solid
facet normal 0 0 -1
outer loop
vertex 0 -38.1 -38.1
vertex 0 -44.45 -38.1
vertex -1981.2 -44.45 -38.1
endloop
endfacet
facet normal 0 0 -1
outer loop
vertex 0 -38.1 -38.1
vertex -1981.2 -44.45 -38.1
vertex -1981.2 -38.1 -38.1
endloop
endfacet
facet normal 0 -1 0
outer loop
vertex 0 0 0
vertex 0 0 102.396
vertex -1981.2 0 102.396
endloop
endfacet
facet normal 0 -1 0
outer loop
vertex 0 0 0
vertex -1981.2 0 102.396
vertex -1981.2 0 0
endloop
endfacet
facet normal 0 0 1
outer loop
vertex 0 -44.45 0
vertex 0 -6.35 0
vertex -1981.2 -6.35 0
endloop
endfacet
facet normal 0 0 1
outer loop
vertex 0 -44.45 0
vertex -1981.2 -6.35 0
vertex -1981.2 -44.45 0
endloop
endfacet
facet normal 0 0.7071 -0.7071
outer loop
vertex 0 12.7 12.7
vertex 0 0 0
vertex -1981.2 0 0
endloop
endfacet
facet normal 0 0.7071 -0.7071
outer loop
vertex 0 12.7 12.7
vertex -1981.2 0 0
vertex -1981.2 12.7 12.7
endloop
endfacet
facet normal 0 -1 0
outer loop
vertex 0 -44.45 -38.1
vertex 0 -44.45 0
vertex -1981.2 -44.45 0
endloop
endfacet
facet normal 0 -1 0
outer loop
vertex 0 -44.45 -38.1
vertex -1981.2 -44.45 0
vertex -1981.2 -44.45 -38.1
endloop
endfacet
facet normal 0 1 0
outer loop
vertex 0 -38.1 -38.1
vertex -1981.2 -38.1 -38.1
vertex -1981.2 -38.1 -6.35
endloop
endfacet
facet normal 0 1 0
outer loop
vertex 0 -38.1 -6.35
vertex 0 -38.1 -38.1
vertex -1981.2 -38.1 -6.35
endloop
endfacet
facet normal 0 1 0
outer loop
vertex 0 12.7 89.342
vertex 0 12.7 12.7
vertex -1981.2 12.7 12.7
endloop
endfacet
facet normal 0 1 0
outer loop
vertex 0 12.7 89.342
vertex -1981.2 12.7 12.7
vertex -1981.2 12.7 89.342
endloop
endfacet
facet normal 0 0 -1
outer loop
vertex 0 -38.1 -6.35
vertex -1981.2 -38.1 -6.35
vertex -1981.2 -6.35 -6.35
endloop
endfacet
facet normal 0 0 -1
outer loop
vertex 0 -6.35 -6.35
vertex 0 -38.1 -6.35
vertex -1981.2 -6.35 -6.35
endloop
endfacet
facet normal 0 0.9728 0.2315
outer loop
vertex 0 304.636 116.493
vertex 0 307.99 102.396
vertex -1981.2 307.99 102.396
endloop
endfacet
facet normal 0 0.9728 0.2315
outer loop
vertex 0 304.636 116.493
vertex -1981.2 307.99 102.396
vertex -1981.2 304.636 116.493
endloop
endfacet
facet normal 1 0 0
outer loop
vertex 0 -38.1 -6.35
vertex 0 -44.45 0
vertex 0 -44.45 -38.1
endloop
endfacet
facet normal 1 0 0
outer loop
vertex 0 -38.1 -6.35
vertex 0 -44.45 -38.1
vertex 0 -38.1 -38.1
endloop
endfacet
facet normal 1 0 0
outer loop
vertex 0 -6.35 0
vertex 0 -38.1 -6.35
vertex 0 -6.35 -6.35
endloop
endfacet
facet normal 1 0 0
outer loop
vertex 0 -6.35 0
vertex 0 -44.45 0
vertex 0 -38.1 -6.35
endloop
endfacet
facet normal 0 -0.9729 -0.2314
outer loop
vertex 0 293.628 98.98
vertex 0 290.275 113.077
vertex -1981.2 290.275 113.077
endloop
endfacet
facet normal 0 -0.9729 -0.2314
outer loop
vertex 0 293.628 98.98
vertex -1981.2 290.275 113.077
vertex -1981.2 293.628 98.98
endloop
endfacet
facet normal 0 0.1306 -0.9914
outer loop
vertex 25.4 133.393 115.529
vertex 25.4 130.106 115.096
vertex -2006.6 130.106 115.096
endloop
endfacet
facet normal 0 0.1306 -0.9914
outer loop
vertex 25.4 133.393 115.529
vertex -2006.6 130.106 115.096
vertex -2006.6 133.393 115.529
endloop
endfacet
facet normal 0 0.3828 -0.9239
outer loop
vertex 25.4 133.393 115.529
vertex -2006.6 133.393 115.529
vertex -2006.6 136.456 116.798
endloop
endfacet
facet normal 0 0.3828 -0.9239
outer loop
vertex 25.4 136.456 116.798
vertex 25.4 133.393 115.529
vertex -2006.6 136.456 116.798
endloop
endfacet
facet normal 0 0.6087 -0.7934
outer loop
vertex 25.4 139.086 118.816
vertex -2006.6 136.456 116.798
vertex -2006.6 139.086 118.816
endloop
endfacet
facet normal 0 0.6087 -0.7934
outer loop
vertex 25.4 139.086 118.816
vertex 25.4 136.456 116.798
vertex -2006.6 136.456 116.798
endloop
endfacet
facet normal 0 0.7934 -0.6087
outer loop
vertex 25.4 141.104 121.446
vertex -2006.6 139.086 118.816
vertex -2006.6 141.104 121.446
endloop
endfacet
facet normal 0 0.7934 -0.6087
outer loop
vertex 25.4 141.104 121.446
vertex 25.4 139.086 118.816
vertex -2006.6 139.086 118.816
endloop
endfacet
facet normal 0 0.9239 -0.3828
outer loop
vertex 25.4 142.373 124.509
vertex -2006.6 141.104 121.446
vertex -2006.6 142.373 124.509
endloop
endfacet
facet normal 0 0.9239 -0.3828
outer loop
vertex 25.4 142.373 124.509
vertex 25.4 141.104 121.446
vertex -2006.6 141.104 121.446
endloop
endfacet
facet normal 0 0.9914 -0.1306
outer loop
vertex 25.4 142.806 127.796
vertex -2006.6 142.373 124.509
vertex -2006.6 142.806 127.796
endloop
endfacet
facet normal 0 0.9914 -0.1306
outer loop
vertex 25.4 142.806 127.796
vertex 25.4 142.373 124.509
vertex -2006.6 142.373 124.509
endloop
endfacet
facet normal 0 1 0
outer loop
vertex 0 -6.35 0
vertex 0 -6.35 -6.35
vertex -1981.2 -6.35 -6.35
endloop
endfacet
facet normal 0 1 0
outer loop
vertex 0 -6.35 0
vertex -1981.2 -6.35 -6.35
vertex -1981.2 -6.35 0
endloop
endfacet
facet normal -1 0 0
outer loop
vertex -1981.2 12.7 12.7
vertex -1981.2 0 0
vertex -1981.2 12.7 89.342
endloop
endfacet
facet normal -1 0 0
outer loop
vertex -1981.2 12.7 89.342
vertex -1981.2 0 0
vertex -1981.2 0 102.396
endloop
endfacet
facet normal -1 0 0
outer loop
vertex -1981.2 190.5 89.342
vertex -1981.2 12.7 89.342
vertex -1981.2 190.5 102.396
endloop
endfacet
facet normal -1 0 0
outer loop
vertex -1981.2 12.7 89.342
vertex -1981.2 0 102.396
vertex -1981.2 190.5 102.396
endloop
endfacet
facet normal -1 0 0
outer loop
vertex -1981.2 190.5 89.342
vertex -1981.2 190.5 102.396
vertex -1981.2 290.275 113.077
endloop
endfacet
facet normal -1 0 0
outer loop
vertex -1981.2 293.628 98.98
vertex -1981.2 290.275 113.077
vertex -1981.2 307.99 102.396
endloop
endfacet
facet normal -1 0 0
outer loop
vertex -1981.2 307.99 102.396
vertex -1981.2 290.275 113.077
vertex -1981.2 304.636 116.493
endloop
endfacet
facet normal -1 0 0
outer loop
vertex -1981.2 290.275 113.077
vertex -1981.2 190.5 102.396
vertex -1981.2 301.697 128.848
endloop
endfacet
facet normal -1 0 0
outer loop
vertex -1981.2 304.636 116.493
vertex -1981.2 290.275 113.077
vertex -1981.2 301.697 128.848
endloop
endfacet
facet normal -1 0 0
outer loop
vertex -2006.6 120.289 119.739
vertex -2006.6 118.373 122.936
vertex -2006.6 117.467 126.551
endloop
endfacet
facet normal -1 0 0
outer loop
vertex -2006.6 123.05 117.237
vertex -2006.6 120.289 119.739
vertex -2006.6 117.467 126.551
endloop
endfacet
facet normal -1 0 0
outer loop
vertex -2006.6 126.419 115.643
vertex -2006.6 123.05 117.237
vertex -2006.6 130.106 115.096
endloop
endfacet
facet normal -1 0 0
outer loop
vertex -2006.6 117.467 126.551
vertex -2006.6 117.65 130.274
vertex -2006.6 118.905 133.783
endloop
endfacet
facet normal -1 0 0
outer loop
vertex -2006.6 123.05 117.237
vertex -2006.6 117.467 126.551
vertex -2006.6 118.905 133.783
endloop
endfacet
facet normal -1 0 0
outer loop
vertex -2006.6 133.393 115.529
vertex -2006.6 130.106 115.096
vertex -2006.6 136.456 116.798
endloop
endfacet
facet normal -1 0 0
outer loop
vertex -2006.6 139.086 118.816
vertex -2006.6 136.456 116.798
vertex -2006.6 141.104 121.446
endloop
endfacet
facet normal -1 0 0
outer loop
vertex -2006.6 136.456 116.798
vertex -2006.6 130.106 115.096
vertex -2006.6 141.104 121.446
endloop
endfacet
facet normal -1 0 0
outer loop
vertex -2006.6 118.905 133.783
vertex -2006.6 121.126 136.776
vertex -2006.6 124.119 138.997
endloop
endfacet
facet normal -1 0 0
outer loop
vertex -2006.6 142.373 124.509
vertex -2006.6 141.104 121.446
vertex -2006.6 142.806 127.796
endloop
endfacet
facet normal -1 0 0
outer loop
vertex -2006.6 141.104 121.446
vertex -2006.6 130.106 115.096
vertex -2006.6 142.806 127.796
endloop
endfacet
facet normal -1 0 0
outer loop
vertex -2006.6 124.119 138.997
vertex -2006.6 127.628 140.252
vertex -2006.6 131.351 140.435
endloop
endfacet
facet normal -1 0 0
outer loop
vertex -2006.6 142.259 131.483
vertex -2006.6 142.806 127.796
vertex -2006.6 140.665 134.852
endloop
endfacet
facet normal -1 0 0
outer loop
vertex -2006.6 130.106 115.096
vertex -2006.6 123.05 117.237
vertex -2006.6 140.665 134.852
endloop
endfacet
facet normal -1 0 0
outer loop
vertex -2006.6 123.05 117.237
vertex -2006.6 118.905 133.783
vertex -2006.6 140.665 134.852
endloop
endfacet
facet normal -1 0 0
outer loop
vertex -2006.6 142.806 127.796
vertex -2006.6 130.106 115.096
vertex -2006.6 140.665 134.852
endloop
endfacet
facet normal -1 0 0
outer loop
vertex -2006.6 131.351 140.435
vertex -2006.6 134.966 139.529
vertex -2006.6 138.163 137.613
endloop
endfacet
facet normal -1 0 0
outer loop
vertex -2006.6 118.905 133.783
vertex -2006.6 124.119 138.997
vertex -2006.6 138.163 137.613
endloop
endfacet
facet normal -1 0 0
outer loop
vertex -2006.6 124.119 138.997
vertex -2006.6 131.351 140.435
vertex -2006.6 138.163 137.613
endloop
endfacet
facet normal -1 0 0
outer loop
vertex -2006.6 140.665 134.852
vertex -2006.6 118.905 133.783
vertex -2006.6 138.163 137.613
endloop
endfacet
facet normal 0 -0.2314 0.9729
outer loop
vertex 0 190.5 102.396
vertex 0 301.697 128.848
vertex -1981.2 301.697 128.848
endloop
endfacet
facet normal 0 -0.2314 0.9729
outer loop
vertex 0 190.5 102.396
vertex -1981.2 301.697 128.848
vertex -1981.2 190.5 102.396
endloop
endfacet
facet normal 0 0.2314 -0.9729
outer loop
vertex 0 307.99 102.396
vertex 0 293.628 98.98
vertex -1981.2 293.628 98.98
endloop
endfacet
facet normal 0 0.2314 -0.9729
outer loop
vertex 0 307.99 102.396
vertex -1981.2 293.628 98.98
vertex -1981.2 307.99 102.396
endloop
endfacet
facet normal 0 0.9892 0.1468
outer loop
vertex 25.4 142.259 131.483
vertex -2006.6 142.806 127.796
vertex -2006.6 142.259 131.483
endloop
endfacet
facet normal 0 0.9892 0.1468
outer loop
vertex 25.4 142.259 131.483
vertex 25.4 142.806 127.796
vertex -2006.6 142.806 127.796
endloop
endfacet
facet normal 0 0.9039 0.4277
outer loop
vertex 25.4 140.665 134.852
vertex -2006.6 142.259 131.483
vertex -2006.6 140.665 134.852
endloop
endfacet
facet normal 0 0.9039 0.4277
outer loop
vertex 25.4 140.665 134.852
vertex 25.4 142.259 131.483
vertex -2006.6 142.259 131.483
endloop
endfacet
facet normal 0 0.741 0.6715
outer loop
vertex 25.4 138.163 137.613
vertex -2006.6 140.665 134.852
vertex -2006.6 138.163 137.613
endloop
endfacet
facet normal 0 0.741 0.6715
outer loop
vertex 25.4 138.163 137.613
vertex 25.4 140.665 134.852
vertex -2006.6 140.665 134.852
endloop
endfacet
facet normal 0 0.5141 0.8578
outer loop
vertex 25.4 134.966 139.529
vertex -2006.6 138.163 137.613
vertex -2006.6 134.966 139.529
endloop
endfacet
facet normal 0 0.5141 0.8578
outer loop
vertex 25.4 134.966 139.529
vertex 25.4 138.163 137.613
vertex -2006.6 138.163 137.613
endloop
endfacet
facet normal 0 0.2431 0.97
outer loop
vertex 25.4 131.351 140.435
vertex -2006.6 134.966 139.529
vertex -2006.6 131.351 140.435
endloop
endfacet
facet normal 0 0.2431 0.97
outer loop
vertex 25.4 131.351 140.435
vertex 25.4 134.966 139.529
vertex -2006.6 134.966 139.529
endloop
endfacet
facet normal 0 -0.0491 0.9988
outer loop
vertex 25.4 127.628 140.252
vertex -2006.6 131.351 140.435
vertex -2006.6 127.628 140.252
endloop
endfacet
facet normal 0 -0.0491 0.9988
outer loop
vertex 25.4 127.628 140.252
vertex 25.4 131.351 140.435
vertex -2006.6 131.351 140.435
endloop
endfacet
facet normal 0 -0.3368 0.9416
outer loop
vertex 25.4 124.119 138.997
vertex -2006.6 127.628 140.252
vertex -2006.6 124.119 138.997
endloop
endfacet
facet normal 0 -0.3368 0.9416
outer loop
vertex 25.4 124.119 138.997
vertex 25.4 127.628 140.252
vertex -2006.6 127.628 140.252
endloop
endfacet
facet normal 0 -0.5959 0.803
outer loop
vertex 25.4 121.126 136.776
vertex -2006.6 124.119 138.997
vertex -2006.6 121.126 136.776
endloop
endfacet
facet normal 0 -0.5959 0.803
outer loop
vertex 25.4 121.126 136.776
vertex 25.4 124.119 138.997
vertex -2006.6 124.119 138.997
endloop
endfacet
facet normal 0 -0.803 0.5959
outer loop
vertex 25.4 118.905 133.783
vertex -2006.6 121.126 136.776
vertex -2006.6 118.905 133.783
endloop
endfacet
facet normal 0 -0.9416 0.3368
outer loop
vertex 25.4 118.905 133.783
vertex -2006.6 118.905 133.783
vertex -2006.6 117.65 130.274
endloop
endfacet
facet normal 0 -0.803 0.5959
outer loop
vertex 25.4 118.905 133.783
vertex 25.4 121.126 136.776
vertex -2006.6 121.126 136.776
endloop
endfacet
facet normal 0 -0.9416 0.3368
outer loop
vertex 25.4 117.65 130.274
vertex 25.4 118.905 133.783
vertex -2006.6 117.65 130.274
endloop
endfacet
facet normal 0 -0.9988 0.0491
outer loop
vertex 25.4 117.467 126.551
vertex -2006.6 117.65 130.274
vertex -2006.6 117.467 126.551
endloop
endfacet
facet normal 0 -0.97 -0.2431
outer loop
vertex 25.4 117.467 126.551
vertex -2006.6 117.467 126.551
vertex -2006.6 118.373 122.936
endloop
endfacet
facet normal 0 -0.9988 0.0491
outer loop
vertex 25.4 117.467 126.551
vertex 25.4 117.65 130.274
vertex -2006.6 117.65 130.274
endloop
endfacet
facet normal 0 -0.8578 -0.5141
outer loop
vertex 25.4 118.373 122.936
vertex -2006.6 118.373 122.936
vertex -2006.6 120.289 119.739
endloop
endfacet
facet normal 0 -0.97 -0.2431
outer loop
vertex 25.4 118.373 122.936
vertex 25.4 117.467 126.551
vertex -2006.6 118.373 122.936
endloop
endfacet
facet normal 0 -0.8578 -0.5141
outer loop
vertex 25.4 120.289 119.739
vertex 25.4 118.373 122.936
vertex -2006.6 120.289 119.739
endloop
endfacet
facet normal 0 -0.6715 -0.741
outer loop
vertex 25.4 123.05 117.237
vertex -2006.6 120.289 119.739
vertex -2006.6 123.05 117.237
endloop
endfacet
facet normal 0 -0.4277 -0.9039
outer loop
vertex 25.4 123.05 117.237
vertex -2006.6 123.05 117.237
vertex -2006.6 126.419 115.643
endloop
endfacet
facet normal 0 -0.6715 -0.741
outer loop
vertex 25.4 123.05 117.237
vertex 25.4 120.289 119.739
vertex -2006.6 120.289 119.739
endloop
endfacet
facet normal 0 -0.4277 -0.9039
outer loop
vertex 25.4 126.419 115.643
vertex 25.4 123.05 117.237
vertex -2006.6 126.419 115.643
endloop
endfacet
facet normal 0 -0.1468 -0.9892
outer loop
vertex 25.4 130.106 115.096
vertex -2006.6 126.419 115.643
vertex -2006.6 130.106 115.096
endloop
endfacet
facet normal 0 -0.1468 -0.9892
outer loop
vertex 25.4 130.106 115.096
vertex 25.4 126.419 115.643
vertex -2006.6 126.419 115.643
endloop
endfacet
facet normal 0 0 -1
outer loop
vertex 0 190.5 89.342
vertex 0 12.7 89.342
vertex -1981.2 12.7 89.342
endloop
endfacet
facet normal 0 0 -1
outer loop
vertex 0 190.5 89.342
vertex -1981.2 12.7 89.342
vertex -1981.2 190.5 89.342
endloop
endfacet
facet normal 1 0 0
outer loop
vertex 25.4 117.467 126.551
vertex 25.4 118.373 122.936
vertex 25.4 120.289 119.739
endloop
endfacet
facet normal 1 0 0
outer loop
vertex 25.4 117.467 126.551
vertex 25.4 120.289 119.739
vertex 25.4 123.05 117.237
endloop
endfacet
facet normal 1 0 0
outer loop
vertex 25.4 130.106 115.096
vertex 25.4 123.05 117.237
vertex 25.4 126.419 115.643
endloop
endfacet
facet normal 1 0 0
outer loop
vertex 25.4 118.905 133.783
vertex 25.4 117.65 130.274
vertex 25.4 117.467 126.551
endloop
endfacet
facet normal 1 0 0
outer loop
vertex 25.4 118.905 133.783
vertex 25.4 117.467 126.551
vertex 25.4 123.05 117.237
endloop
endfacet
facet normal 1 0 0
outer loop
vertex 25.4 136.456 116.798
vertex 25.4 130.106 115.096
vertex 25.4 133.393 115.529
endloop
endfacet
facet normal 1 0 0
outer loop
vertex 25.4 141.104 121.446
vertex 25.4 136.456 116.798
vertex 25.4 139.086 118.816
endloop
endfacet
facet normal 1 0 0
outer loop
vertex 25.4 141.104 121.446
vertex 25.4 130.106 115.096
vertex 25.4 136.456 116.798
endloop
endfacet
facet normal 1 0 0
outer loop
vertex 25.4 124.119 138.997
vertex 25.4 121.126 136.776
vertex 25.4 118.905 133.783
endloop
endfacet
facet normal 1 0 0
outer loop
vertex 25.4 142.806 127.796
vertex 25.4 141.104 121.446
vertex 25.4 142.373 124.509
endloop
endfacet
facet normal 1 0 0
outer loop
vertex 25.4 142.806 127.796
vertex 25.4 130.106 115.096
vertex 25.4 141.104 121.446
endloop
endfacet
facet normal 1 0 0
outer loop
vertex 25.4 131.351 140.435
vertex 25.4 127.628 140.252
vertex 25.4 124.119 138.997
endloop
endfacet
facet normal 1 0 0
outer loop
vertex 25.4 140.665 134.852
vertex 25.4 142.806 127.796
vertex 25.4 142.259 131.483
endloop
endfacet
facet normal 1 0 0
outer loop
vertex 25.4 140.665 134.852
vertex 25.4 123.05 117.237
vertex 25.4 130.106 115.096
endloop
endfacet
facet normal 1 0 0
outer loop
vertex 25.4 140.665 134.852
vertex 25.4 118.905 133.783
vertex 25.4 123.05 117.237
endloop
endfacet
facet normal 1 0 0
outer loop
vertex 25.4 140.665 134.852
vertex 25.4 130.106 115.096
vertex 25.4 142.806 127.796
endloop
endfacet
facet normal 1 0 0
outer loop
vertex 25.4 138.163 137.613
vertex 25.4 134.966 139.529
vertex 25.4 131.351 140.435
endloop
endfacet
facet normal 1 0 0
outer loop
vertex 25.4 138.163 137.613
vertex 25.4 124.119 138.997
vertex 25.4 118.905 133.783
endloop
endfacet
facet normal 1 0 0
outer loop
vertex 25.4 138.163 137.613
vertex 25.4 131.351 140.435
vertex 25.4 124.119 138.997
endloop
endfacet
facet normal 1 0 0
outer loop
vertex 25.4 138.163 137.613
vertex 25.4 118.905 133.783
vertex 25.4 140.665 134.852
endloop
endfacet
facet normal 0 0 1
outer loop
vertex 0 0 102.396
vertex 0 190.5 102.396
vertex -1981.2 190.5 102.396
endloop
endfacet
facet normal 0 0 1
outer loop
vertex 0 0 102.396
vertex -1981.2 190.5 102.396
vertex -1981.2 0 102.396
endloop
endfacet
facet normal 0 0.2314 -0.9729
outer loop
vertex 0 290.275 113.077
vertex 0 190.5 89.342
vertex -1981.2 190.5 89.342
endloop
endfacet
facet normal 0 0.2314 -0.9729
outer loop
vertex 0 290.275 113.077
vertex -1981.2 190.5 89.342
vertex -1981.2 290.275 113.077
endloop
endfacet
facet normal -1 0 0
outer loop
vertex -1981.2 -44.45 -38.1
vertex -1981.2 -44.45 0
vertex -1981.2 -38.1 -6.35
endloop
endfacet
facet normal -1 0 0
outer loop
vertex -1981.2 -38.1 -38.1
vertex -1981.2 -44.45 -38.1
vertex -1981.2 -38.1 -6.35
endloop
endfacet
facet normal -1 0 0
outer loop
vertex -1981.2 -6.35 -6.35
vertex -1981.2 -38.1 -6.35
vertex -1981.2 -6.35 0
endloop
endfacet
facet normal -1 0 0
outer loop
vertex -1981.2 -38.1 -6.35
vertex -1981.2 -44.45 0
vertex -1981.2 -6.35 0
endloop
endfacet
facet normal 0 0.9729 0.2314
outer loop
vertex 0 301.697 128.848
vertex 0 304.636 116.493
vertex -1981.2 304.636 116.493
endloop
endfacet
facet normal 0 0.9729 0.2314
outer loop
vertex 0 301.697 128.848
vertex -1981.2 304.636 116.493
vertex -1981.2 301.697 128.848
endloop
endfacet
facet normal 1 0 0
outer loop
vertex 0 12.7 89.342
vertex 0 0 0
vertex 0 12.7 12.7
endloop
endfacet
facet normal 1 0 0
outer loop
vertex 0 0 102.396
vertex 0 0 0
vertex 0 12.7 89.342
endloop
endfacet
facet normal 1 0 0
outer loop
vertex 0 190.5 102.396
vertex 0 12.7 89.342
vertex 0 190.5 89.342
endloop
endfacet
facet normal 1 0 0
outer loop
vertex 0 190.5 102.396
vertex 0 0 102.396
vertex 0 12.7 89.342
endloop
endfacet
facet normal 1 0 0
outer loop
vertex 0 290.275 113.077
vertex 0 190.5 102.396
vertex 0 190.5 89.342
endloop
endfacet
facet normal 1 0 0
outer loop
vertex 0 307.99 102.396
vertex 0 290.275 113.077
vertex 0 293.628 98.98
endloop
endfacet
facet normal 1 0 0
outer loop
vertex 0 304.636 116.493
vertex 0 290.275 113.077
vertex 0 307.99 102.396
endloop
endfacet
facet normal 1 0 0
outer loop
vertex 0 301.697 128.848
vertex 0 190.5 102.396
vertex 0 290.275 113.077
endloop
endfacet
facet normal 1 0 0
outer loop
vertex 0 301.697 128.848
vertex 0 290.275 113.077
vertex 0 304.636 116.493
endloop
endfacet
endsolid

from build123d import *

# Parameters (mm, degrees)
F1_DEPTH      = 1981.2
F3_DEPTH      = 1981.2
F5_DEPTH      = 25.4
F5_DEPTH_BACK = 2006.6


with BuildPart() as f1:
    # F0 (on Right) → F1 (new body)
    with BuildSketch(Plane.YZ):
        Polygon((0, 101.6), (0, 0), (12.7, 12.7), (12.7, 101.6), align=None)
        Polygon((-6.35, -6.35), (-6.35, 0), (-44.45, 0), (-44.45, -38.1), (-38.1, -38.1), (-38.1, -6.35), align=None)
    extrude(amount=-F1_DEPTH)

    # F2 (on Right) → F3 (join)
    with BuildSketch(Plane.YZ):
        Polygon((190.5, 102.396213), (0, 102.396213), (0, 89.341822), (190.5, 89.341822), (290.274997, 113.076571), (304.636168, 116.492846), (301.697072, 128.848076), align=None)
        Polygon((307.989514, 102.396213), (304.636168, 116.492846), (290.274997, 113.076571), (293.628342, 98.979938), align=None)
    extrude(amount=-F3_DEPTH)


with BuildPart() as f5:
    # F4 (on face) → F5 (new body, two sides)
    with BuildSketch(Plane.YZ) as f5_sk:
        with BuildLine():
            ThreePointArc((142.805823, 127.796213), (121.125567, 136.776469), (130.105823, 115.096213))
            ThreePointArc((130.105823, 115.096213), (139.086079, 118.815956), (142.805823, 127.796213))
        make_face()
    extrude(amount=F5_DEPTH)
    extrude(f5_sk.sketch, amount=-F5_DEPTH_BACK)


solid = Compound([f1.part, f5.part])
